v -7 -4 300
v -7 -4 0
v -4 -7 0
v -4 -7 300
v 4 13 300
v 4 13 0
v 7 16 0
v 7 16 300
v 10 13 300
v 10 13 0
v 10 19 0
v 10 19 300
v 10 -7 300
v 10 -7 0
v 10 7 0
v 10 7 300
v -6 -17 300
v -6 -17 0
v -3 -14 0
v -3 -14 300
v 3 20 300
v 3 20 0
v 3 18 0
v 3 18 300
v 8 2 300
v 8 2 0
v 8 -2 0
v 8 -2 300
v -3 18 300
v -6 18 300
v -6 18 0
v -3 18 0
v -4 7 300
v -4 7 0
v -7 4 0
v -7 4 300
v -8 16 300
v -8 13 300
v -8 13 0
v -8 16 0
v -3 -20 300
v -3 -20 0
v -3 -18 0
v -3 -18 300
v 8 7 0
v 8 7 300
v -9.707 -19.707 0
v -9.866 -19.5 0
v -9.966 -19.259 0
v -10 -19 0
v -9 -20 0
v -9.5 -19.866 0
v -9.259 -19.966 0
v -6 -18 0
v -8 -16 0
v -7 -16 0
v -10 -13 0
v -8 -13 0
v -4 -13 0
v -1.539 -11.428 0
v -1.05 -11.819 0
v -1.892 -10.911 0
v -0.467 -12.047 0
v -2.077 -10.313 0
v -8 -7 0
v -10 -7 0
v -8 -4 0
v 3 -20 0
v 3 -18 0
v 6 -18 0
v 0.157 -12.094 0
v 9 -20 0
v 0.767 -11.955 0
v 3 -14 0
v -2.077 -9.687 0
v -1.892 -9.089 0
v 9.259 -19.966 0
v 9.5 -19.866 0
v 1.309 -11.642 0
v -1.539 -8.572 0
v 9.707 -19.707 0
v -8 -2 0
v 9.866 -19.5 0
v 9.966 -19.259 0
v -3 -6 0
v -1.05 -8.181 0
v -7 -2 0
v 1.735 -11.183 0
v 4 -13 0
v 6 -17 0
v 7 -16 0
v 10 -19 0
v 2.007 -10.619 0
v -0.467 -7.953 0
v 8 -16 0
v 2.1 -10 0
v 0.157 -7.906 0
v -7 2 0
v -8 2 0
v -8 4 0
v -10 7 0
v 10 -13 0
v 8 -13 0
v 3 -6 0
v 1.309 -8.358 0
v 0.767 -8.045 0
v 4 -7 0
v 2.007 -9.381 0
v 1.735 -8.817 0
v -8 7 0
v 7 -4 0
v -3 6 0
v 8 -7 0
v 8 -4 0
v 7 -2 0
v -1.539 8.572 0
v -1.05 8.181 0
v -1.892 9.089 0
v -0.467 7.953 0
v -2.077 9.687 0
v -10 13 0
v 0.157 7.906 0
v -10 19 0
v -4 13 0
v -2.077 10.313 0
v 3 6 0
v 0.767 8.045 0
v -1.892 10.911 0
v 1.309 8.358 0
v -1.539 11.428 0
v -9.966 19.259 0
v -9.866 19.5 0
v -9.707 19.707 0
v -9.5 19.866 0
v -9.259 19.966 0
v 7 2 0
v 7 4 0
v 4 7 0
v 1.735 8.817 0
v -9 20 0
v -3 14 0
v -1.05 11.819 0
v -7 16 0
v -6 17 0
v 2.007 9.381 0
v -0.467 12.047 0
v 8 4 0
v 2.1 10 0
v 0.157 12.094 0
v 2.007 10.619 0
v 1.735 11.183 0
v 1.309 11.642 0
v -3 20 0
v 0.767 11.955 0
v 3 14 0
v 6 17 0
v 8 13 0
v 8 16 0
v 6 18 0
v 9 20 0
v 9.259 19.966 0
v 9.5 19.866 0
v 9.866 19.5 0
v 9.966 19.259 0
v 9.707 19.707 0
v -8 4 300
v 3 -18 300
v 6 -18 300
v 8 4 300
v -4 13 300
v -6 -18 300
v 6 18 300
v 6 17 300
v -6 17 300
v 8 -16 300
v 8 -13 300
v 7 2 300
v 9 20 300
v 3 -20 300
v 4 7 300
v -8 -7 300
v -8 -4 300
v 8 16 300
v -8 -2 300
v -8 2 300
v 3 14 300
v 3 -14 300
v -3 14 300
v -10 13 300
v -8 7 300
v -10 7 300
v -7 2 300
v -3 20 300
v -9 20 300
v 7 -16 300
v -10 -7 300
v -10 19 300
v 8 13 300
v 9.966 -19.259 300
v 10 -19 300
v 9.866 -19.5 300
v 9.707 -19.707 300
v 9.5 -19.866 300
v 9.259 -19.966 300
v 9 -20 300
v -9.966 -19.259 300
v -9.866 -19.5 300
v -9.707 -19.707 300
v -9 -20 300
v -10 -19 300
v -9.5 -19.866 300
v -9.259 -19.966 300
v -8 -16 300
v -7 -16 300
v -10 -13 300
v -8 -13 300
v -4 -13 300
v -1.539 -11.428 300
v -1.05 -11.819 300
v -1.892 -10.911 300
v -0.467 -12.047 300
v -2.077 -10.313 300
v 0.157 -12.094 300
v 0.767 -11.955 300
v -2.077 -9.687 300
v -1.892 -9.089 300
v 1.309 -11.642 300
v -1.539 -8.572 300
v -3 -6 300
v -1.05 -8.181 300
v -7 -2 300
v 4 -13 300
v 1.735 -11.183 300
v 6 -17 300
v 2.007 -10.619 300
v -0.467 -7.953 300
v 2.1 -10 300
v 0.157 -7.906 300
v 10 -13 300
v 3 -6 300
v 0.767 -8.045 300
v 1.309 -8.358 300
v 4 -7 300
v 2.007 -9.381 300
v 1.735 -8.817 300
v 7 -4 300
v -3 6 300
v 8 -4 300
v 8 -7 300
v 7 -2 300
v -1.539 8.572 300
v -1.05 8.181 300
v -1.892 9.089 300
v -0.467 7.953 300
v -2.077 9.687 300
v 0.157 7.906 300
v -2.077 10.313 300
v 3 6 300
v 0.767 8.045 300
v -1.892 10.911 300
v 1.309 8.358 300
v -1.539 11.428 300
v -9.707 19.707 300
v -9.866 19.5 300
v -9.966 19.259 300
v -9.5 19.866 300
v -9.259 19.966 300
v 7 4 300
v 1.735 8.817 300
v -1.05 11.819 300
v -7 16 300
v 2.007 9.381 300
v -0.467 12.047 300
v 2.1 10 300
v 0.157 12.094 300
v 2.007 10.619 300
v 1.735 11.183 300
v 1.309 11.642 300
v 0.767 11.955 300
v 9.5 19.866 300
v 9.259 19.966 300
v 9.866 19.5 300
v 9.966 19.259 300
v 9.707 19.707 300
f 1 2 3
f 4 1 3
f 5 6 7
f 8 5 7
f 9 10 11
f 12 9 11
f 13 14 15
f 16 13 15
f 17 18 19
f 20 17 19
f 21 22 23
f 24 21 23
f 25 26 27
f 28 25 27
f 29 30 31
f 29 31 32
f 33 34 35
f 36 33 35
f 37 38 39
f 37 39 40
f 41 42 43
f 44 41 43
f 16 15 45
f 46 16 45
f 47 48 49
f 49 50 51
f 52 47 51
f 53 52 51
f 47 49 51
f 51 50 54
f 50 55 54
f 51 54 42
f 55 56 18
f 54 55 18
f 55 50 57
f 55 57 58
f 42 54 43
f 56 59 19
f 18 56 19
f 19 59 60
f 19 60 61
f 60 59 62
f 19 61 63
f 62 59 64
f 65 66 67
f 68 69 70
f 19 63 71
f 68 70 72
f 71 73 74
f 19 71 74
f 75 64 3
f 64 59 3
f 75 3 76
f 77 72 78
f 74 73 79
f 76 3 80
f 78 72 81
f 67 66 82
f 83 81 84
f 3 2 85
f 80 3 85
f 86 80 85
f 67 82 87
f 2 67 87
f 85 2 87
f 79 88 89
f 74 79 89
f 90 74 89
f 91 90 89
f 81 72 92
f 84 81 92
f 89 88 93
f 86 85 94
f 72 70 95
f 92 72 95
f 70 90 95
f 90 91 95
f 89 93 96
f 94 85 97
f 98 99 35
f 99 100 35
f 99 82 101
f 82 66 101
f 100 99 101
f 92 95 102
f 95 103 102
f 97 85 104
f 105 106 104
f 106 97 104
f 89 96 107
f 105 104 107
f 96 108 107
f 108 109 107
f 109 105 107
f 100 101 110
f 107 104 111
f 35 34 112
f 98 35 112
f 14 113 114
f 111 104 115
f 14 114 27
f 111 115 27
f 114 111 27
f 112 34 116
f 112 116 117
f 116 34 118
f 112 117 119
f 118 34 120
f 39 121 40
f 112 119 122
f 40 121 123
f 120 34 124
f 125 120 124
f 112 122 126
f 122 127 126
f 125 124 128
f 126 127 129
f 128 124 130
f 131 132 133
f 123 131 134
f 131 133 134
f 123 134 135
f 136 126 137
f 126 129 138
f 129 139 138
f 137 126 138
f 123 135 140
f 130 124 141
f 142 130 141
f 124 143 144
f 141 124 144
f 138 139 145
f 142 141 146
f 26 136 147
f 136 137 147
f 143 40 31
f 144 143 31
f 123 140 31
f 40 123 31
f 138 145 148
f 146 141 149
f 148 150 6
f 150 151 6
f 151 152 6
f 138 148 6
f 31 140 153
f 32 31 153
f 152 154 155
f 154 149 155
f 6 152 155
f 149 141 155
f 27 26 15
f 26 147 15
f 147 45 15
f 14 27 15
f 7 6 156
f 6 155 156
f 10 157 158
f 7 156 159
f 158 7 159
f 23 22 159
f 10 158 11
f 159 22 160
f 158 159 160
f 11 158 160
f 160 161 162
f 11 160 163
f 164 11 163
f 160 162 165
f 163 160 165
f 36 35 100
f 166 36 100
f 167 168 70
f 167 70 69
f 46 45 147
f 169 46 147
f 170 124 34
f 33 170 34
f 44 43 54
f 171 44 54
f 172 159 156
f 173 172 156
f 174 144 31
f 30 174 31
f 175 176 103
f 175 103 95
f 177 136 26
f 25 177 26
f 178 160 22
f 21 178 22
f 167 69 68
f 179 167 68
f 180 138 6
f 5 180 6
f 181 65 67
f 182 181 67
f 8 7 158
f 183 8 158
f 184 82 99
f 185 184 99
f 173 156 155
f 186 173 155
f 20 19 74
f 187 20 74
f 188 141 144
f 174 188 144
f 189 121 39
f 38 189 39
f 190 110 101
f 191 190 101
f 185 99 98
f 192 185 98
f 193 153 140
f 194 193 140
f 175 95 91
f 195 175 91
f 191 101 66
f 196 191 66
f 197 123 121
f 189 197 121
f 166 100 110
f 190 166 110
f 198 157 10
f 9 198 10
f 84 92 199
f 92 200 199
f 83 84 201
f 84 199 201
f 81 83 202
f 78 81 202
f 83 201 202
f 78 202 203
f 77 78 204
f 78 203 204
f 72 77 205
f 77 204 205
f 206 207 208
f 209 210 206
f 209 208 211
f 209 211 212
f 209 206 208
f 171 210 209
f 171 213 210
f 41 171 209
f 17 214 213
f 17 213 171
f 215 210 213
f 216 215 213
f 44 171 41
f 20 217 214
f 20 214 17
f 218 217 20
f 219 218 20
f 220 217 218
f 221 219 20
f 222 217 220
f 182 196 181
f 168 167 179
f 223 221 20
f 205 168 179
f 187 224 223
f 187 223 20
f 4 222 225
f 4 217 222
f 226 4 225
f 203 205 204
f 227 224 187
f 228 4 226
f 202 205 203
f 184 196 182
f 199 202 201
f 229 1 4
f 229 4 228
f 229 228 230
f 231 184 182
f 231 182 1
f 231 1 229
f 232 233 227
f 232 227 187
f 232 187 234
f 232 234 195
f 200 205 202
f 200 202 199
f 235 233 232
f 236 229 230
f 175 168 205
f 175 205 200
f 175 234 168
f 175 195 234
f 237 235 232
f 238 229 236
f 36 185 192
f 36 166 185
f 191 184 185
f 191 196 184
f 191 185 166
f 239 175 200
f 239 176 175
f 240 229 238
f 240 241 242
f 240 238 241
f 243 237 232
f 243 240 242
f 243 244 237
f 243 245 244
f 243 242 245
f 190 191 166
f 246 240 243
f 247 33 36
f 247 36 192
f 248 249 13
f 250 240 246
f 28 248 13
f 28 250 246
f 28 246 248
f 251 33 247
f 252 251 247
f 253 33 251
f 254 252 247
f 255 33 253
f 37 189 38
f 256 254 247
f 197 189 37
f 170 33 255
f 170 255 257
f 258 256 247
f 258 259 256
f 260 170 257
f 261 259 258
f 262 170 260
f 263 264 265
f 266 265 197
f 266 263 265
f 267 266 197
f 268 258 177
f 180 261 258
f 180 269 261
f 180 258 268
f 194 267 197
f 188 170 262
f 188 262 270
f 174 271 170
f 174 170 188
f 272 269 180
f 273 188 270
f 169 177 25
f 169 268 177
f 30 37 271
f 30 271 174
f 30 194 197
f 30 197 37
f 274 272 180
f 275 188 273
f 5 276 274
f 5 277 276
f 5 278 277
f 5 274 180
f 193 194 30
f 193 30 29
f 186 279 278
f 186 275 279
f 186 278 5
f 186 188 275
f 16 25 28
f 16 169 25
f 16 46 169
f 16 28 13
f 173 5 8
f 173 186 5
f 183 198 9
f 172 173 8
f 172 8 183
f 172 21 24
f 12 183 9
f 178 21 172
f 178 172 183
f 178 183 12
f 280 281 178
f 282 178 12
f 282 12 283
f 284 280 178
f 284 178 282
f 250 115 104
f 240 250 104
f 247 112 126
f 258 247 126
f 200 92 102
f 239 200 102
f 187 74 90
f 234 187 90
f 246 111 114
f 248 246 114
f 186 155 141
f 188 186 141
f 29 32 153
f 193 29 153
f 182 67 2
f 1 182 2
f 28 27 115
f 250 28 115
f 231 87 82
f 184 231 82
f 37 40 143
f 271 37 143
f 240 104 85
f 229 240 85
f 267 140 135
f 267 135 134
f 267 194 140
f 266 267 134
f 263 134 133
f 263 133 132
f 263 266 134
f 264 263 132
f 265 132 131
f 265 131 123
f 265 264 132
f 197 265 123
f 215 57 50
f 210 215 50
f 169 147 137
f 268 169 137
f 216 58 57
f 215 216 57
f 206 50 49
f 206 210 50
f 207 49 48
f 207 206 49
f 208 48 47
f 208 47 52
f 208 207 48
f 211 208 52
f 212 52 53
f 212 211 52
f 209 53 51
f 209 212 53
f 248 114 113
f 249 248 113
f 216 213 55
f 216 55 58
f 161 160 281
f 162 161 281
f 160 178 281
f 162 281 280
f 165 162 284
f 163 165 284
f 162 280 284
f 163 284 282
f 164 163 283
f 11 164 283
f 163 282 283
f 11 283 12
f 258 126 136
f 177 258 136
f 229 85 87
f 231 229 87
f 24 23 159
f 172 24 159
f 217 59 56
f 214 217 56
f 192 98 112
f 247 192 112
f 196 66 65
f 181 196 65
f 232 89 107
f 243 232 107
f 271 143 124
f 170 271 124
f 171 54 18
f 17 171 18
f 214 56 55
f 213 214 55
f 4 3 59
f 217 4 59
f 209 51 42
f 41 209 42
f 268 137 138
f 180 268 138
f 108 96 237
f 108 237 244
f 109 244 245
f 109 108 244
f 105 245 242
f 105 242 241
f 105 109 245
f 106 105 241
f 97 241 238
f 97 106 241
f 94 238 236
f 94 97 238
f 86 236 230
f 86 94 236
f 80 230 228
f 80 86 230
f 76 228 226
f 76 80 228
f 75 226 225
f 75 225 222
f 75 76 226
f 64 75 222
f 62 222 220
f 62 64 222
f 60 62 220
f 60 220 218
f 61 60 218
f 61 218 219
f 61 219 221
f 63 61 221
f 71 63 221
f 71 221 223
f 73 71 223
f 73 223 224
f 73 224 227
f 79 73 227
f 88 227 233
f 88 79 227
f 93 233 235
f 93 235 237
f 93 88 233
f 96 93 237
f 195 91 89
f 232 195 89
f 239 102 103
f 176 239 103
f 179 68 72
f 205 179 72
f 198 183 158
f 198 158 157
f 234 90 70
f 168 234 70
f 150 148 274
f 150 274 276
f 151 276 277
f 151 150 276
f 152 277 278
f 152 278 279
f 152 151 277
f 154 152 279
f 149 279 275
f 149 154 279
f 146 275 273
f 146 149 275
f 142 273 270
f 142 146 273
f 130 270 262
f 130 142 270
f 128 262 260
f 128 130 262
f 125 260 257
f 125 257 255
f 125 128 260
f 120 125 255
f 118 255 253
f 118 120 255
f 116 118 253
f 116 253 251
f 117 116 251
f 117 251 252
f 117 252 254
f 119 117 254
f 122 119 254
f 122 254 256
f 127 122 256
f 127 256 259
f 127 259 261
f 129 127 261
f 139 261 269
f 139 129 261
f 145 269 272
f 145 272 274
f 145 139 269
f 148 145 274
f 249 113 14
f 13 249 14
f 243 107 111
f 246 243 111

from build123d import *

# Parameters (mm, degrees)
SCHIZZO1_R                   = 2.1
ESTRUSIONE_ESTRUSIONE1_DEPTH = 300
RACCORDO1_R                  = 1


with BuildPart() as part:
    # Schizzo1 → Estrusione-Estrusione1 (new body)
    with BuildSketch(Plane.XY):
        Polygon((-3, 20), (-10, 20), (-10, 13), (-8, 13), (-8, 16), (-7, 16), (-4, 13), (-4, 7), (-7, 4), (-8, 4), (-8, 7), (-10, 7), (-10, -7), (-8, -7), (-8, -4), (-7, -4), (-4, -7), (-4, -13), (-7, -16), (-8, -16), (-8, -13), (-10, -13), (-10, -20), (-3, -20), (-3, -18), (-6, -18), (-6, -17), (-3, -14), (3, -14), (6, -17), (6, -18), (3, -18), (3, -20), (10, -20), (10, -13), (8, -13), (8, -16), (7, -16), (4, -13), (4, -7), (7, -4), (8, -4), (8, -7), (10, -7), (10, 7), (8, 7), (8, 4), (7, 4), (4, 7), (4, 13), (7, 16), (8, 16), (8, 13), (10, 13), (10, 20), (3, 20), (3, 18), (6, 18), (6, 17), (3, 14), (-3, 14), (-6, 17), (-6, 18), (-3, 18), align=None)
        Polygon((8, 2), (8, -2), (7, -2), (3, -6), (-3, -6), (-7, -2), (-8, -2), (-8, 2), (-7, 2), (-3, 6), (3, 6), (7, 2), align=None, mode=Mode.SUBTRACT)
        with Locations((0, 10)):
            Circle(SCHIZZO1_R, mode=Mode.SUBTRACT)
        with Locations((0, -10)):
            Circle(SCHIZZO1_R, mode=Mode.SUBTRACT)
    extrude(amount=ESTRUSIONE_ESTRUSIONE1_DEPTH)

    # Raccordo1
    raccordo1_edges = [part.edges().sort_by_distance(p)[0] for p in [
        (-10, 20, 150),
        (10, 20, 150),
        (10, -20, 150),
        (-10, -20, 150),
    ]]
    fillet(raccordo1_edges, radius=RACCORDO1_R)


solid = part.part
